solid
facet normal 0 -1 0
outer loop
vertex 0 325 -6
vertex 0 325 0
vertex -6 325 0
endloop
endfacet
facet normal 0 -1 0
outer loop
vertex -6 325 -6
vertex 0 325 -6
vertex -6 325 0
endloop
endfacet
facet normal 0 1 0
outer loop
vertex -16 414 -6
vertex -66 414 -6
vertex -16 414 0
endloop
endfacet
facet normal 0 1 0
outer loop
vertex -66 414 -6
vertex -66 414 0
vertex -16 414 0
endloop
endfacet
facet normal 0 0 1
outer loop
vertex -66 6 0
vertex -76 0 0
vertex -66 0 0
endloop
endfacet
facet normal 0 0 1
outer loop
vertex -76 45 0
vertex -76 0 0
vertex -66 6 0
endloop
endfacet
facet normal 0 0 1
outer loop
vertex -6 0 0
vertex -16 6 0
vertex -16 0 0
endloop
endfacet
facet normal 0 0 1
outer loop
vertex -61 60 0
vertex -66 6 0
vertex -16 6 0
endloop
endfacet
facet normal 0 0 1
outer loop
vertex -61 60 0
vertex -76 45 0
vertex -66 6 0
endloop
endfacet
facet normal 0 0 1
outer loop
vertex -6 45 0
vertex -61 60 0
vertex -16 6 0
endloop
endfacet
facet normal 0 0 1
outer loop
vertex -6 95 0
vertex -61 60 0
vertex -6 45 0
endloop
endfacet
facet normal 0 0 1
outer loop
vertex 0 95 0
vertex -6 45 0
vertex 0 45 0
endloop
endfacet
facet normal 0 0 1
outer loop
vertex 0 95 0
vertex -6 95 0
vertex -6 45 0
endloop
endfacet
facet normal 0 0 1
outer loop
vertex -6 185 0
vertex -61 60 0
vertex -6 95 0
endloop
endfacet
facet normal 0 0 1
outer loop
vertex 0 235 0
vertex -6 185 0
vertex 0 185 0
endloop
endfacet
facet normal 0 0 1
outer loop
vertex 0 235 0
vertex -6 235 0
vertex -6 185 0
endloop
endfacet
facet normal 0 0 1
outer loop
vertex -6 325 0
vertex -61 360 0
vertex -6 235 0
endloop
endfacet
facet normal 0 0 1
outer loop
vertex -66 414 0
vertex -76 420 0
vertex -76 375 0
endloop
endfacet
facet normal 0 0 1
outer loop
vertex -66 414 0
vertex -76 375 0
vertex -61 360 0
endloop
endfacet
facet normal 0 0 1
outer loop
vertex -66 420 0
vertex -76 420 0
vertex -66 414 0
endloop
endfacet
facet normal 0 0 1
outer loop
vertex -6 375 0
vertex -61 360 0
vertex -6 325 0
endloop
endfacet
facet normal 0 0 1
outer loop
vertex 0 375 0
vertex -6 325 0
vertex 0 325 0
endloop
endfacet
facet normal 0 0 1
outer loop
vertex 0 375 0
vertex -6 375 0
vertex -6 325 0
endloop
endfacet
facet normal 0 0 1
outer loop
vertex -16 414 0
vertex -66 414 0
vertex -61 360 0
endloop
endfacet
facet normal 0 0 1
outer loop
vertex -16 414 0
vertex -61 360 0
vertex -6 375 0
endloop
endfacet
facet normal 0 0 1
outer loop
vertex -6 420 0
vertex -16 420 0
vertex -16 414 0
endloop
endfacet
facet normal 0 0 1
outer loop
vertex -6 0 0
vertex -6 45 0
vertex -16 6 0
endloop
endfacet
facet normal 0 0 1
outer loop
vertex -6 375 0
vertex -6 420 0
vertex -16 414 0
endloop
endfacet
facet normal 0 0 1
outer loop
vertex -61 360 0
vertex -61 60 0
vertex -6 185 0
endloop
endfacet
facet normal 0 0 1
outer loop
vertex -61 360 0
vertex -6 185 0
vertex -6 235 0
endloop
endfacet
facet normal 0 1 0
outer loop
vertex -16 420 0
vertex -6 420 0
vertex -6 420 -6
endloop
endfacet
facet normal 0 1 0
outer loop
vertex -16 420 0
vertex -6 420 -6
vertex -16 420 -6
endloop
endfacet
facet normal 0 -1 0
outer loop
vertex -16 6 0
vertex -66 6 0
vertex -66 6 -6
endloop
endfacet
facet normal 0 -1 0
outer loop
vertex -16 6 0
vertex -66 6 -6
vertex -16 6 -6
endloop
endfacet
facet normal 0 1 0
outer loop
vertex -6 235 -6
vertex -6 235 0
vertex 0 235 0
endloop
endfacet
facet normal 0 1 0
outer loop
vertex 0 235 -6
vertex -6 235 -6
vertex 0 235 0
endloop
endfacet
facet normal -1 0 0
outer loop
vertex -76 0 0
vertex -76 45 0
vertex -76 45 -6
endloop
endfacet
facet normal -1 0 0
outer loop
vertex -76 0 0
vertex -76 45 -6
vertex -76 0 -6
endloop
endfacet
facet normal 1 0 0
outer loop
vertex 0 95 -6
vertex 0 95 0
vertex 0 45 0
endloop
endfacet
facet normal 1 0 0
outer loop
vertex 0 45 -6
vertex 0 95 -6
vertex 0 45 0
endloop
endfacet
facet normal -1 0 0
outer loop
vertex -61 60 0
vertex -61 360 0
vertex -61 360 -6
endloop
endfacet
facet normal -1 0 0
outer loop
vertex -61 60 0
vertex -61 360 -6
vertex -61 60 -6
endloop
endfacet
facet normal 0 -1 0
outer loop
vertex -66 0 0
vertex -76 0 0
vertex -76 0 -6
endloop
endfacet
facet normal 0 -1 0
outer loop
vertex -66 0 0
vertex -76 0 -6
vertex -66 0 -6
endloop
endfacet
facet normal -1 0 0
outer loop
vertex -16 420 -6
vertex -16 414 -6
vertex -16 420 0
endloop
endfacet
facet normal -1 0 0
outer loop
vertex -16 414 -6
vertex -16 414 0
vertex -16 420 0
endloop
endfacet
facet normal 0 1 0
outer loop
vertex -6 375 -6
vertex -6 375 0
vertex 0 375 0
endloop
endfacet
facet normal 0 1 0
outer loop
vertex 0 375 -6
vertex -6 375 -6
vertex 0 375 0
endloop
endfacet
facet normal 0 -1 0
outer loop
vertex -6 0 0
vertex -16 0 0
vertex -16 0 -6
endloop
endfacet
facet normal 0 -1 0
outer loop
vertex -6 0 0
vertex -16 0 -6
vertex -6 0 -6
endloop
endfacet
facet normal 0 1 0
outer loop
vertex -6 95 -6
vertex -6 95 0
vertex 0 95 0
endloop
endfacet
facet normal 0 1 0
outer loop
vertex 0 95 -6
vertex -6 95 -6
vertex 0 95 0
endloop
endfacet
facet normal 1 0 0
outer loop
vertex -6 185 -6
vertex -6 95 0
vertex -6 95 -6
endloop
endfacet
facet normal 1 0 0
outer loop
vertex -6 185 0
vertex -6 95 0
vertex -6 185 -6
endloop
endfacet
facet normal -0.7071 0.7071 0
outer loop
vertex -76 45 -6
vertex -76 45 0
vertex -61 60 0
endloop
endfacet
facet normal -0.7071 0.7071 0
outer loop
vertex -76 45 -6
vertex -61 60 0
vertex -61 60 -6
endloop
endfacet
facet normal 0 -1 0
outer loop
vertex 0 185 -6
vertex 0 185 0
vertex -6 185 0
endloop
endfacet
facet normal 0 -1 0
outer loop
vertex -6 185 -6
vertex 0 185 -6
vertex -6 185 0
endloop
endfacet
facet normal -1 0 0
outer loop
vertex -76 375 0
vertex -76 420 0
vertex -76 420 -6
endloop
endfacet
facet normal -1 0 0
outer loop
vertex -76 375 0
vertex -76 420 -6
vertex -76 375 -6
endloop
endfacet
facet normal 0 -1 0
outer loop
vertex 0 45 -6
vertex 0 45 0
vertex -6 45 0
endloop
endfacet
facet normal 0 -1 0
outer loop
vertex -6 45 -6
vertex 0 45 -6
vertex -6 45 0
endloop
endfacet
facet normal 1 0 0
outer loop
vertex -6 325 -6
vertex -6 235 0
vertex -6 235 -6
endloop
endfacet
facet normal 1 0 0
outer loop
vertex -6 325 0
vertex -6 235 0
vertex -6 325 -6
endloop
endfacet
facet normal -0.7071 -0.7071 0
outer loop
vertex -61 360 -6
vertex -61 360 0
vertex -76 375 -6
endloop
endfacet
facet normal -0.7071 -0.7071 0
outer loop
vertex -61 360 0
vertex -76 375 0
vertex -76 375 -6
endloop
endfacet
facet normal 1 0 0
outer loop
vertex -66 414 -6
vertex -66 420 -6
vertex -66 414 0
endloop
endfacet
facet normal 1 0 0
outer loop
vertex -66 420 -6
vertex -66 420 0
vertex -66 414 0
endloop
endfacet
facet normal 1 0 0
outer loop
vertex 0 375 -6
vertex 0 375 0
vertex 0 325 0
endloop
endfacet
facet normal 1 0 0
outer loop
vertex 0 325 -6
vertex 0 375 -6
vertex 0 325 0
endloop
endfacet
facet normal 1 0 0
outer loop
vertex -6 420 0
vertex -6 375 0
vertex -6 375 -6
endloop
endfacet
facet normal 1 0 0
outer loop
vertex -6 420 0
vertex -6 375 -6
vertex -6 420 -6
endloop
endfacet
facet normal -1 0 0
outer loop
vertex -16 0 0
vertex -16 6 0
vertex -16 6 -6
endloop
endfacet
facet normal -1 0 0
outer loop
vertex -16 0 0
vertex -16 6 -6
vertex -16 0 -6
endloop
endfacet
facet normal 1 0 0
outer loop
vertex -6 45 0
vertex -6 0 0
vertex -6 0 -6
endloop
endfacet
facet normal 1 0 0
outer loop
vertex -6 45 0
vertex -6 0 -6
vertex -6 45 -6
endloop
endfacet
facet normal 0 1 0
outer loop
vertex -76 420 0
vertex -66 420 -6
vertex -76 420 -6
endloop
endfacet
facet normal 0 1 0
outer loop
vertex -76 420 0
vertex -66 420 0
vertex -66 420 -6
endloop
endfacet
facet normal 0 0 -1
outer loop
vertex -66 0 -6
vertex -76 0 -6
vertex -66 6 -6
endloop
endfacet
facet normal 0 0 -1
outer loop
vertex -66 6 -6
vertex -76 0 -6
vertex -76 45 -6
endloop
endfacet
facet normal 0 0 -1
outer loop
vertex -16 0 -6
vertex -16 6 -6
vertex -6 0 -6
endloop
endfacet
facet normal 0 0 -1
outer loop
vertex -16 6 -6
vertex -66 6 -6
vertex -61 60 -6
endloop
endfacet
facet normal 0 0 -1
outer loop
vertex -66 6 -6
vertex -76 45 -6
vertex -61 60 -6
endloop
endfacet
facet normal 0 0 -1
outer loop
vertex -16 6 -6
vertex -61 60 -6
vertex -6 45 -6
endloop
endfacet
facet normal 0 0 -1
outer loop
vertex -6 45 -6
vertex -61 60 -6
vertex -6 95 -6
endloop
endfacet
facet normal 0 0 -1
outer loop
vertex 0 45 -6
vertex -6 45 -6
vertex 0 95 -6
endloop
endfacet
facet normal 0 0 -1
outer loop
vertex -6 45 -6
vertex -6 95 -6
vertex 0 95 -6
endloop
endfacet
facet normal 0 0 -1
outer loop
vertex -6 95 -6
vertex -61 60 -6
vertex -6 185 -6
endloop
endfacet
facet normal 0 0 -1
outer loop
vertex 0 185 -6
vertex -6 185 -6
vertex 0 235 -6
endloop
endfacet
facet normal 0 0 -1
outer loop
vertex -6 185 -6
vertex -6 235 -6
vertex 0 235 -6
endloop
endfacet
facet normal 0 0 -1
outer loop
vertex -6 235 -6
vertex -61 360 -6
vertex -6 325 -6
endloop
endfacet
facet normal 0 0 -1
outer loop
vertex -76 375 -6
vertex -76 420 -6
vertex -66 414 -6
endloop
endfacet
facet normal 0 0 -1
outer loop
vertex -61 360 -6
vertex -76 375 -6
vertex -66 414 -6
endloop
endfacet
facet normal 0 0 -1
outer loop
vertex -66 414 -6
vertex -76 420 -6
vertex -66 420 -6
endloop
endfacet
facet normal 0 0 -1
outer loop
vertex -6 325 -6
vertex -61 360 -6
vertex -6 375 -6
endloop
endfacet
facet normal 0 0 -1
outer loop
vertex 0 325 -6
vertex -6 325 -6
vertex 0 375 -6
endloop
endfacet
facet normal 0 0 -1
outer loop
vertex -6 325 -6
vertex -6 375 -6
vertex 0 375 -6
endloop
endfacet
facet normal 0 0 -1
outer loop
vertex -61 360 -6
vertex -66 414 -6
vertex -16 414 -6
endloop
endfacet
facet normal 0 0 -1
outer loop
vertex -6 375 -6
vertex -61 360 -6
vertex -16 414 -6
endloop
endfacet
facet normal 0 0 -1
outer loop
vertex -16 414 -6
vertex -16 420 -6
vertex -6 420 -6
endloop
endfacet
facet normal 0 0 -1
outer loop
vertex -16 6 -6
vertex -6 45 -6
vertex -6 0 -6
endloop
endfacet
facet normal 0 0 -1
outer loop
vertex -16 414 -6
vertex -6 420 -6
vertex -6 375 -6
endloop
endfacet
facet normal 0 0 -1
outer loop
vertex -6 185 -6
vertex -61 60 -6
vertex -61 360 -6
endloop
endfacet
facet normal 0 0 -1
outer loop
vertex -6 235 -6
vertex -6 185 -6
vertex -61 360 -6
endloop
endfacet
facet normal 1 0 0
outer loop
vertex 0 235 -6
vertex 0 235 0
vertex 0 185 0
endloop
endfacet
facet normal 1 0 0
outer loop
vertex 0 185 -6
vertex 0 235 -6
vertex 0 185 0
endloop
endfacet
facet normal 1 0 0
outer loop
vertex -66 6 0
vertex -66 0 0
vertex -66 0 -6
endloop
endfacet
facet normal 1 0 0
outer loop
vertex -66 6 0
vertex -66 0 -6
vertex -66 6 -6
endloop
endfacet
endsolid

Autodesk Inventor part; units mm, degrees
ref_plane "YZ Plane" through (0, 0, 0) normal (1, 0, 0) x (0, 1, 0)
ref_plane "XZ Plane" through (0, 0, 0) normal (0, 1, 0) x (-1, 0, 0)
ref_plane "XY Plane" through (0, 0, 0) normal (0, 0, 1) x (1, 0, 0)
sketch "Sketch1" plane through (0, 0, 0) normal (0, 0, 1) x (1, 0, 0)
  line L0 (-6, 375) -> (0, 375) construction
  line L1 (0, 375) -> (0, 420) construction
  line L2 (0, 420) -> (-6, 420) construction
  line L3 (-6, 375) -> (-6, 420) construction
  line L4 (-6, 235) -> (0, 235) construction
  line L5 (0, 235) -> (0, 325) construction
  line L6 (0, 325) -> (-6, 325) construction
  line L7 (-6, 235) -> (-6, 325) construction
  line L8 (0, 185) -> (-6, 185) construction
  line L9 (-6, 95) -> (-6, 185) construction
  line L10 (-6, 95) -> (0, 95) construction
  line L11 (0, 95) -> (0, 185) construction
  line L12 (0, 45) -> (-6, 45) construction
  line L13 (-6, 0) -> (-6, 45) construction
  line L14 (0, 0) -> (-6, 0) construction
  line L15 (0, 0) -> (0, 45) construction
  line L16 (-6, 375) -> (0, 375)
  line L17 (0, 375) -> (0, 325)
  line L18 (0, 325) -> (-6, 325)
  line L19 (-6, 235) -> (0, 235)
  line L20 (0, 235) -> (0, 185)
  line L21 (0, 185) -> (-6, 185)
  line L22 (-6, 95) -> (0, 95)
  line L23 (0, 95) -> (0, 45)
  line L24 (0, 45) -> (-6, 45)
  line L25 (-6, 0) -> (-6, 45)
  line L26 (-6, 95) -> (-6, 185)
  line L27 (-6, 235) -> (-6, 325)
  line L28 (-6, 375) -> (-6, 420)
  line L29 (-76, 375) -> (-61, 375)
  line L30 (-61, 375) -> (-61, 45)
  line L31 (-61, 45) -> (-76, 45)
  line L32 (-76, 420) -> (-76, 375)
  line L33 (-76, 45) -> (-76, 0)
  line L34 (-66, 420) -> (-66, 414)
  line L35 (-66, 414) -> (-16, 414)
  line L36 (-16, 414) -> (-16, 420)
  line L37 (0, 210) -> (-61, 210) construction
  line L38 (-66, 0) -> (-66, 6)
  line L39 (-66, 6) -> (-16, 6)
  line L40 (-16, 6) -> (-16, 0)
  line L41 (-76, 0) -> (-66, 0)
  line L42 (-16, 0) -> (-6, 0)
  line L43 (-6, 420) -> (-16, 420)
  line L44 (-66, 420) -> (-76, 420)
  dimension "d0" = 70
  dimension "d1" = 15
  dimension "d2" = 50
  dimension "d3" = 6
  dimension "d4" = 10
extrude "Extrusion1" add sketch "Sketch1" against normal blind 6
chamfer "Chamfer1" distance 15 angle 45 2 edges at (-61, 375, -3) (-61, 45, -3)
properties part number "Frontal"
